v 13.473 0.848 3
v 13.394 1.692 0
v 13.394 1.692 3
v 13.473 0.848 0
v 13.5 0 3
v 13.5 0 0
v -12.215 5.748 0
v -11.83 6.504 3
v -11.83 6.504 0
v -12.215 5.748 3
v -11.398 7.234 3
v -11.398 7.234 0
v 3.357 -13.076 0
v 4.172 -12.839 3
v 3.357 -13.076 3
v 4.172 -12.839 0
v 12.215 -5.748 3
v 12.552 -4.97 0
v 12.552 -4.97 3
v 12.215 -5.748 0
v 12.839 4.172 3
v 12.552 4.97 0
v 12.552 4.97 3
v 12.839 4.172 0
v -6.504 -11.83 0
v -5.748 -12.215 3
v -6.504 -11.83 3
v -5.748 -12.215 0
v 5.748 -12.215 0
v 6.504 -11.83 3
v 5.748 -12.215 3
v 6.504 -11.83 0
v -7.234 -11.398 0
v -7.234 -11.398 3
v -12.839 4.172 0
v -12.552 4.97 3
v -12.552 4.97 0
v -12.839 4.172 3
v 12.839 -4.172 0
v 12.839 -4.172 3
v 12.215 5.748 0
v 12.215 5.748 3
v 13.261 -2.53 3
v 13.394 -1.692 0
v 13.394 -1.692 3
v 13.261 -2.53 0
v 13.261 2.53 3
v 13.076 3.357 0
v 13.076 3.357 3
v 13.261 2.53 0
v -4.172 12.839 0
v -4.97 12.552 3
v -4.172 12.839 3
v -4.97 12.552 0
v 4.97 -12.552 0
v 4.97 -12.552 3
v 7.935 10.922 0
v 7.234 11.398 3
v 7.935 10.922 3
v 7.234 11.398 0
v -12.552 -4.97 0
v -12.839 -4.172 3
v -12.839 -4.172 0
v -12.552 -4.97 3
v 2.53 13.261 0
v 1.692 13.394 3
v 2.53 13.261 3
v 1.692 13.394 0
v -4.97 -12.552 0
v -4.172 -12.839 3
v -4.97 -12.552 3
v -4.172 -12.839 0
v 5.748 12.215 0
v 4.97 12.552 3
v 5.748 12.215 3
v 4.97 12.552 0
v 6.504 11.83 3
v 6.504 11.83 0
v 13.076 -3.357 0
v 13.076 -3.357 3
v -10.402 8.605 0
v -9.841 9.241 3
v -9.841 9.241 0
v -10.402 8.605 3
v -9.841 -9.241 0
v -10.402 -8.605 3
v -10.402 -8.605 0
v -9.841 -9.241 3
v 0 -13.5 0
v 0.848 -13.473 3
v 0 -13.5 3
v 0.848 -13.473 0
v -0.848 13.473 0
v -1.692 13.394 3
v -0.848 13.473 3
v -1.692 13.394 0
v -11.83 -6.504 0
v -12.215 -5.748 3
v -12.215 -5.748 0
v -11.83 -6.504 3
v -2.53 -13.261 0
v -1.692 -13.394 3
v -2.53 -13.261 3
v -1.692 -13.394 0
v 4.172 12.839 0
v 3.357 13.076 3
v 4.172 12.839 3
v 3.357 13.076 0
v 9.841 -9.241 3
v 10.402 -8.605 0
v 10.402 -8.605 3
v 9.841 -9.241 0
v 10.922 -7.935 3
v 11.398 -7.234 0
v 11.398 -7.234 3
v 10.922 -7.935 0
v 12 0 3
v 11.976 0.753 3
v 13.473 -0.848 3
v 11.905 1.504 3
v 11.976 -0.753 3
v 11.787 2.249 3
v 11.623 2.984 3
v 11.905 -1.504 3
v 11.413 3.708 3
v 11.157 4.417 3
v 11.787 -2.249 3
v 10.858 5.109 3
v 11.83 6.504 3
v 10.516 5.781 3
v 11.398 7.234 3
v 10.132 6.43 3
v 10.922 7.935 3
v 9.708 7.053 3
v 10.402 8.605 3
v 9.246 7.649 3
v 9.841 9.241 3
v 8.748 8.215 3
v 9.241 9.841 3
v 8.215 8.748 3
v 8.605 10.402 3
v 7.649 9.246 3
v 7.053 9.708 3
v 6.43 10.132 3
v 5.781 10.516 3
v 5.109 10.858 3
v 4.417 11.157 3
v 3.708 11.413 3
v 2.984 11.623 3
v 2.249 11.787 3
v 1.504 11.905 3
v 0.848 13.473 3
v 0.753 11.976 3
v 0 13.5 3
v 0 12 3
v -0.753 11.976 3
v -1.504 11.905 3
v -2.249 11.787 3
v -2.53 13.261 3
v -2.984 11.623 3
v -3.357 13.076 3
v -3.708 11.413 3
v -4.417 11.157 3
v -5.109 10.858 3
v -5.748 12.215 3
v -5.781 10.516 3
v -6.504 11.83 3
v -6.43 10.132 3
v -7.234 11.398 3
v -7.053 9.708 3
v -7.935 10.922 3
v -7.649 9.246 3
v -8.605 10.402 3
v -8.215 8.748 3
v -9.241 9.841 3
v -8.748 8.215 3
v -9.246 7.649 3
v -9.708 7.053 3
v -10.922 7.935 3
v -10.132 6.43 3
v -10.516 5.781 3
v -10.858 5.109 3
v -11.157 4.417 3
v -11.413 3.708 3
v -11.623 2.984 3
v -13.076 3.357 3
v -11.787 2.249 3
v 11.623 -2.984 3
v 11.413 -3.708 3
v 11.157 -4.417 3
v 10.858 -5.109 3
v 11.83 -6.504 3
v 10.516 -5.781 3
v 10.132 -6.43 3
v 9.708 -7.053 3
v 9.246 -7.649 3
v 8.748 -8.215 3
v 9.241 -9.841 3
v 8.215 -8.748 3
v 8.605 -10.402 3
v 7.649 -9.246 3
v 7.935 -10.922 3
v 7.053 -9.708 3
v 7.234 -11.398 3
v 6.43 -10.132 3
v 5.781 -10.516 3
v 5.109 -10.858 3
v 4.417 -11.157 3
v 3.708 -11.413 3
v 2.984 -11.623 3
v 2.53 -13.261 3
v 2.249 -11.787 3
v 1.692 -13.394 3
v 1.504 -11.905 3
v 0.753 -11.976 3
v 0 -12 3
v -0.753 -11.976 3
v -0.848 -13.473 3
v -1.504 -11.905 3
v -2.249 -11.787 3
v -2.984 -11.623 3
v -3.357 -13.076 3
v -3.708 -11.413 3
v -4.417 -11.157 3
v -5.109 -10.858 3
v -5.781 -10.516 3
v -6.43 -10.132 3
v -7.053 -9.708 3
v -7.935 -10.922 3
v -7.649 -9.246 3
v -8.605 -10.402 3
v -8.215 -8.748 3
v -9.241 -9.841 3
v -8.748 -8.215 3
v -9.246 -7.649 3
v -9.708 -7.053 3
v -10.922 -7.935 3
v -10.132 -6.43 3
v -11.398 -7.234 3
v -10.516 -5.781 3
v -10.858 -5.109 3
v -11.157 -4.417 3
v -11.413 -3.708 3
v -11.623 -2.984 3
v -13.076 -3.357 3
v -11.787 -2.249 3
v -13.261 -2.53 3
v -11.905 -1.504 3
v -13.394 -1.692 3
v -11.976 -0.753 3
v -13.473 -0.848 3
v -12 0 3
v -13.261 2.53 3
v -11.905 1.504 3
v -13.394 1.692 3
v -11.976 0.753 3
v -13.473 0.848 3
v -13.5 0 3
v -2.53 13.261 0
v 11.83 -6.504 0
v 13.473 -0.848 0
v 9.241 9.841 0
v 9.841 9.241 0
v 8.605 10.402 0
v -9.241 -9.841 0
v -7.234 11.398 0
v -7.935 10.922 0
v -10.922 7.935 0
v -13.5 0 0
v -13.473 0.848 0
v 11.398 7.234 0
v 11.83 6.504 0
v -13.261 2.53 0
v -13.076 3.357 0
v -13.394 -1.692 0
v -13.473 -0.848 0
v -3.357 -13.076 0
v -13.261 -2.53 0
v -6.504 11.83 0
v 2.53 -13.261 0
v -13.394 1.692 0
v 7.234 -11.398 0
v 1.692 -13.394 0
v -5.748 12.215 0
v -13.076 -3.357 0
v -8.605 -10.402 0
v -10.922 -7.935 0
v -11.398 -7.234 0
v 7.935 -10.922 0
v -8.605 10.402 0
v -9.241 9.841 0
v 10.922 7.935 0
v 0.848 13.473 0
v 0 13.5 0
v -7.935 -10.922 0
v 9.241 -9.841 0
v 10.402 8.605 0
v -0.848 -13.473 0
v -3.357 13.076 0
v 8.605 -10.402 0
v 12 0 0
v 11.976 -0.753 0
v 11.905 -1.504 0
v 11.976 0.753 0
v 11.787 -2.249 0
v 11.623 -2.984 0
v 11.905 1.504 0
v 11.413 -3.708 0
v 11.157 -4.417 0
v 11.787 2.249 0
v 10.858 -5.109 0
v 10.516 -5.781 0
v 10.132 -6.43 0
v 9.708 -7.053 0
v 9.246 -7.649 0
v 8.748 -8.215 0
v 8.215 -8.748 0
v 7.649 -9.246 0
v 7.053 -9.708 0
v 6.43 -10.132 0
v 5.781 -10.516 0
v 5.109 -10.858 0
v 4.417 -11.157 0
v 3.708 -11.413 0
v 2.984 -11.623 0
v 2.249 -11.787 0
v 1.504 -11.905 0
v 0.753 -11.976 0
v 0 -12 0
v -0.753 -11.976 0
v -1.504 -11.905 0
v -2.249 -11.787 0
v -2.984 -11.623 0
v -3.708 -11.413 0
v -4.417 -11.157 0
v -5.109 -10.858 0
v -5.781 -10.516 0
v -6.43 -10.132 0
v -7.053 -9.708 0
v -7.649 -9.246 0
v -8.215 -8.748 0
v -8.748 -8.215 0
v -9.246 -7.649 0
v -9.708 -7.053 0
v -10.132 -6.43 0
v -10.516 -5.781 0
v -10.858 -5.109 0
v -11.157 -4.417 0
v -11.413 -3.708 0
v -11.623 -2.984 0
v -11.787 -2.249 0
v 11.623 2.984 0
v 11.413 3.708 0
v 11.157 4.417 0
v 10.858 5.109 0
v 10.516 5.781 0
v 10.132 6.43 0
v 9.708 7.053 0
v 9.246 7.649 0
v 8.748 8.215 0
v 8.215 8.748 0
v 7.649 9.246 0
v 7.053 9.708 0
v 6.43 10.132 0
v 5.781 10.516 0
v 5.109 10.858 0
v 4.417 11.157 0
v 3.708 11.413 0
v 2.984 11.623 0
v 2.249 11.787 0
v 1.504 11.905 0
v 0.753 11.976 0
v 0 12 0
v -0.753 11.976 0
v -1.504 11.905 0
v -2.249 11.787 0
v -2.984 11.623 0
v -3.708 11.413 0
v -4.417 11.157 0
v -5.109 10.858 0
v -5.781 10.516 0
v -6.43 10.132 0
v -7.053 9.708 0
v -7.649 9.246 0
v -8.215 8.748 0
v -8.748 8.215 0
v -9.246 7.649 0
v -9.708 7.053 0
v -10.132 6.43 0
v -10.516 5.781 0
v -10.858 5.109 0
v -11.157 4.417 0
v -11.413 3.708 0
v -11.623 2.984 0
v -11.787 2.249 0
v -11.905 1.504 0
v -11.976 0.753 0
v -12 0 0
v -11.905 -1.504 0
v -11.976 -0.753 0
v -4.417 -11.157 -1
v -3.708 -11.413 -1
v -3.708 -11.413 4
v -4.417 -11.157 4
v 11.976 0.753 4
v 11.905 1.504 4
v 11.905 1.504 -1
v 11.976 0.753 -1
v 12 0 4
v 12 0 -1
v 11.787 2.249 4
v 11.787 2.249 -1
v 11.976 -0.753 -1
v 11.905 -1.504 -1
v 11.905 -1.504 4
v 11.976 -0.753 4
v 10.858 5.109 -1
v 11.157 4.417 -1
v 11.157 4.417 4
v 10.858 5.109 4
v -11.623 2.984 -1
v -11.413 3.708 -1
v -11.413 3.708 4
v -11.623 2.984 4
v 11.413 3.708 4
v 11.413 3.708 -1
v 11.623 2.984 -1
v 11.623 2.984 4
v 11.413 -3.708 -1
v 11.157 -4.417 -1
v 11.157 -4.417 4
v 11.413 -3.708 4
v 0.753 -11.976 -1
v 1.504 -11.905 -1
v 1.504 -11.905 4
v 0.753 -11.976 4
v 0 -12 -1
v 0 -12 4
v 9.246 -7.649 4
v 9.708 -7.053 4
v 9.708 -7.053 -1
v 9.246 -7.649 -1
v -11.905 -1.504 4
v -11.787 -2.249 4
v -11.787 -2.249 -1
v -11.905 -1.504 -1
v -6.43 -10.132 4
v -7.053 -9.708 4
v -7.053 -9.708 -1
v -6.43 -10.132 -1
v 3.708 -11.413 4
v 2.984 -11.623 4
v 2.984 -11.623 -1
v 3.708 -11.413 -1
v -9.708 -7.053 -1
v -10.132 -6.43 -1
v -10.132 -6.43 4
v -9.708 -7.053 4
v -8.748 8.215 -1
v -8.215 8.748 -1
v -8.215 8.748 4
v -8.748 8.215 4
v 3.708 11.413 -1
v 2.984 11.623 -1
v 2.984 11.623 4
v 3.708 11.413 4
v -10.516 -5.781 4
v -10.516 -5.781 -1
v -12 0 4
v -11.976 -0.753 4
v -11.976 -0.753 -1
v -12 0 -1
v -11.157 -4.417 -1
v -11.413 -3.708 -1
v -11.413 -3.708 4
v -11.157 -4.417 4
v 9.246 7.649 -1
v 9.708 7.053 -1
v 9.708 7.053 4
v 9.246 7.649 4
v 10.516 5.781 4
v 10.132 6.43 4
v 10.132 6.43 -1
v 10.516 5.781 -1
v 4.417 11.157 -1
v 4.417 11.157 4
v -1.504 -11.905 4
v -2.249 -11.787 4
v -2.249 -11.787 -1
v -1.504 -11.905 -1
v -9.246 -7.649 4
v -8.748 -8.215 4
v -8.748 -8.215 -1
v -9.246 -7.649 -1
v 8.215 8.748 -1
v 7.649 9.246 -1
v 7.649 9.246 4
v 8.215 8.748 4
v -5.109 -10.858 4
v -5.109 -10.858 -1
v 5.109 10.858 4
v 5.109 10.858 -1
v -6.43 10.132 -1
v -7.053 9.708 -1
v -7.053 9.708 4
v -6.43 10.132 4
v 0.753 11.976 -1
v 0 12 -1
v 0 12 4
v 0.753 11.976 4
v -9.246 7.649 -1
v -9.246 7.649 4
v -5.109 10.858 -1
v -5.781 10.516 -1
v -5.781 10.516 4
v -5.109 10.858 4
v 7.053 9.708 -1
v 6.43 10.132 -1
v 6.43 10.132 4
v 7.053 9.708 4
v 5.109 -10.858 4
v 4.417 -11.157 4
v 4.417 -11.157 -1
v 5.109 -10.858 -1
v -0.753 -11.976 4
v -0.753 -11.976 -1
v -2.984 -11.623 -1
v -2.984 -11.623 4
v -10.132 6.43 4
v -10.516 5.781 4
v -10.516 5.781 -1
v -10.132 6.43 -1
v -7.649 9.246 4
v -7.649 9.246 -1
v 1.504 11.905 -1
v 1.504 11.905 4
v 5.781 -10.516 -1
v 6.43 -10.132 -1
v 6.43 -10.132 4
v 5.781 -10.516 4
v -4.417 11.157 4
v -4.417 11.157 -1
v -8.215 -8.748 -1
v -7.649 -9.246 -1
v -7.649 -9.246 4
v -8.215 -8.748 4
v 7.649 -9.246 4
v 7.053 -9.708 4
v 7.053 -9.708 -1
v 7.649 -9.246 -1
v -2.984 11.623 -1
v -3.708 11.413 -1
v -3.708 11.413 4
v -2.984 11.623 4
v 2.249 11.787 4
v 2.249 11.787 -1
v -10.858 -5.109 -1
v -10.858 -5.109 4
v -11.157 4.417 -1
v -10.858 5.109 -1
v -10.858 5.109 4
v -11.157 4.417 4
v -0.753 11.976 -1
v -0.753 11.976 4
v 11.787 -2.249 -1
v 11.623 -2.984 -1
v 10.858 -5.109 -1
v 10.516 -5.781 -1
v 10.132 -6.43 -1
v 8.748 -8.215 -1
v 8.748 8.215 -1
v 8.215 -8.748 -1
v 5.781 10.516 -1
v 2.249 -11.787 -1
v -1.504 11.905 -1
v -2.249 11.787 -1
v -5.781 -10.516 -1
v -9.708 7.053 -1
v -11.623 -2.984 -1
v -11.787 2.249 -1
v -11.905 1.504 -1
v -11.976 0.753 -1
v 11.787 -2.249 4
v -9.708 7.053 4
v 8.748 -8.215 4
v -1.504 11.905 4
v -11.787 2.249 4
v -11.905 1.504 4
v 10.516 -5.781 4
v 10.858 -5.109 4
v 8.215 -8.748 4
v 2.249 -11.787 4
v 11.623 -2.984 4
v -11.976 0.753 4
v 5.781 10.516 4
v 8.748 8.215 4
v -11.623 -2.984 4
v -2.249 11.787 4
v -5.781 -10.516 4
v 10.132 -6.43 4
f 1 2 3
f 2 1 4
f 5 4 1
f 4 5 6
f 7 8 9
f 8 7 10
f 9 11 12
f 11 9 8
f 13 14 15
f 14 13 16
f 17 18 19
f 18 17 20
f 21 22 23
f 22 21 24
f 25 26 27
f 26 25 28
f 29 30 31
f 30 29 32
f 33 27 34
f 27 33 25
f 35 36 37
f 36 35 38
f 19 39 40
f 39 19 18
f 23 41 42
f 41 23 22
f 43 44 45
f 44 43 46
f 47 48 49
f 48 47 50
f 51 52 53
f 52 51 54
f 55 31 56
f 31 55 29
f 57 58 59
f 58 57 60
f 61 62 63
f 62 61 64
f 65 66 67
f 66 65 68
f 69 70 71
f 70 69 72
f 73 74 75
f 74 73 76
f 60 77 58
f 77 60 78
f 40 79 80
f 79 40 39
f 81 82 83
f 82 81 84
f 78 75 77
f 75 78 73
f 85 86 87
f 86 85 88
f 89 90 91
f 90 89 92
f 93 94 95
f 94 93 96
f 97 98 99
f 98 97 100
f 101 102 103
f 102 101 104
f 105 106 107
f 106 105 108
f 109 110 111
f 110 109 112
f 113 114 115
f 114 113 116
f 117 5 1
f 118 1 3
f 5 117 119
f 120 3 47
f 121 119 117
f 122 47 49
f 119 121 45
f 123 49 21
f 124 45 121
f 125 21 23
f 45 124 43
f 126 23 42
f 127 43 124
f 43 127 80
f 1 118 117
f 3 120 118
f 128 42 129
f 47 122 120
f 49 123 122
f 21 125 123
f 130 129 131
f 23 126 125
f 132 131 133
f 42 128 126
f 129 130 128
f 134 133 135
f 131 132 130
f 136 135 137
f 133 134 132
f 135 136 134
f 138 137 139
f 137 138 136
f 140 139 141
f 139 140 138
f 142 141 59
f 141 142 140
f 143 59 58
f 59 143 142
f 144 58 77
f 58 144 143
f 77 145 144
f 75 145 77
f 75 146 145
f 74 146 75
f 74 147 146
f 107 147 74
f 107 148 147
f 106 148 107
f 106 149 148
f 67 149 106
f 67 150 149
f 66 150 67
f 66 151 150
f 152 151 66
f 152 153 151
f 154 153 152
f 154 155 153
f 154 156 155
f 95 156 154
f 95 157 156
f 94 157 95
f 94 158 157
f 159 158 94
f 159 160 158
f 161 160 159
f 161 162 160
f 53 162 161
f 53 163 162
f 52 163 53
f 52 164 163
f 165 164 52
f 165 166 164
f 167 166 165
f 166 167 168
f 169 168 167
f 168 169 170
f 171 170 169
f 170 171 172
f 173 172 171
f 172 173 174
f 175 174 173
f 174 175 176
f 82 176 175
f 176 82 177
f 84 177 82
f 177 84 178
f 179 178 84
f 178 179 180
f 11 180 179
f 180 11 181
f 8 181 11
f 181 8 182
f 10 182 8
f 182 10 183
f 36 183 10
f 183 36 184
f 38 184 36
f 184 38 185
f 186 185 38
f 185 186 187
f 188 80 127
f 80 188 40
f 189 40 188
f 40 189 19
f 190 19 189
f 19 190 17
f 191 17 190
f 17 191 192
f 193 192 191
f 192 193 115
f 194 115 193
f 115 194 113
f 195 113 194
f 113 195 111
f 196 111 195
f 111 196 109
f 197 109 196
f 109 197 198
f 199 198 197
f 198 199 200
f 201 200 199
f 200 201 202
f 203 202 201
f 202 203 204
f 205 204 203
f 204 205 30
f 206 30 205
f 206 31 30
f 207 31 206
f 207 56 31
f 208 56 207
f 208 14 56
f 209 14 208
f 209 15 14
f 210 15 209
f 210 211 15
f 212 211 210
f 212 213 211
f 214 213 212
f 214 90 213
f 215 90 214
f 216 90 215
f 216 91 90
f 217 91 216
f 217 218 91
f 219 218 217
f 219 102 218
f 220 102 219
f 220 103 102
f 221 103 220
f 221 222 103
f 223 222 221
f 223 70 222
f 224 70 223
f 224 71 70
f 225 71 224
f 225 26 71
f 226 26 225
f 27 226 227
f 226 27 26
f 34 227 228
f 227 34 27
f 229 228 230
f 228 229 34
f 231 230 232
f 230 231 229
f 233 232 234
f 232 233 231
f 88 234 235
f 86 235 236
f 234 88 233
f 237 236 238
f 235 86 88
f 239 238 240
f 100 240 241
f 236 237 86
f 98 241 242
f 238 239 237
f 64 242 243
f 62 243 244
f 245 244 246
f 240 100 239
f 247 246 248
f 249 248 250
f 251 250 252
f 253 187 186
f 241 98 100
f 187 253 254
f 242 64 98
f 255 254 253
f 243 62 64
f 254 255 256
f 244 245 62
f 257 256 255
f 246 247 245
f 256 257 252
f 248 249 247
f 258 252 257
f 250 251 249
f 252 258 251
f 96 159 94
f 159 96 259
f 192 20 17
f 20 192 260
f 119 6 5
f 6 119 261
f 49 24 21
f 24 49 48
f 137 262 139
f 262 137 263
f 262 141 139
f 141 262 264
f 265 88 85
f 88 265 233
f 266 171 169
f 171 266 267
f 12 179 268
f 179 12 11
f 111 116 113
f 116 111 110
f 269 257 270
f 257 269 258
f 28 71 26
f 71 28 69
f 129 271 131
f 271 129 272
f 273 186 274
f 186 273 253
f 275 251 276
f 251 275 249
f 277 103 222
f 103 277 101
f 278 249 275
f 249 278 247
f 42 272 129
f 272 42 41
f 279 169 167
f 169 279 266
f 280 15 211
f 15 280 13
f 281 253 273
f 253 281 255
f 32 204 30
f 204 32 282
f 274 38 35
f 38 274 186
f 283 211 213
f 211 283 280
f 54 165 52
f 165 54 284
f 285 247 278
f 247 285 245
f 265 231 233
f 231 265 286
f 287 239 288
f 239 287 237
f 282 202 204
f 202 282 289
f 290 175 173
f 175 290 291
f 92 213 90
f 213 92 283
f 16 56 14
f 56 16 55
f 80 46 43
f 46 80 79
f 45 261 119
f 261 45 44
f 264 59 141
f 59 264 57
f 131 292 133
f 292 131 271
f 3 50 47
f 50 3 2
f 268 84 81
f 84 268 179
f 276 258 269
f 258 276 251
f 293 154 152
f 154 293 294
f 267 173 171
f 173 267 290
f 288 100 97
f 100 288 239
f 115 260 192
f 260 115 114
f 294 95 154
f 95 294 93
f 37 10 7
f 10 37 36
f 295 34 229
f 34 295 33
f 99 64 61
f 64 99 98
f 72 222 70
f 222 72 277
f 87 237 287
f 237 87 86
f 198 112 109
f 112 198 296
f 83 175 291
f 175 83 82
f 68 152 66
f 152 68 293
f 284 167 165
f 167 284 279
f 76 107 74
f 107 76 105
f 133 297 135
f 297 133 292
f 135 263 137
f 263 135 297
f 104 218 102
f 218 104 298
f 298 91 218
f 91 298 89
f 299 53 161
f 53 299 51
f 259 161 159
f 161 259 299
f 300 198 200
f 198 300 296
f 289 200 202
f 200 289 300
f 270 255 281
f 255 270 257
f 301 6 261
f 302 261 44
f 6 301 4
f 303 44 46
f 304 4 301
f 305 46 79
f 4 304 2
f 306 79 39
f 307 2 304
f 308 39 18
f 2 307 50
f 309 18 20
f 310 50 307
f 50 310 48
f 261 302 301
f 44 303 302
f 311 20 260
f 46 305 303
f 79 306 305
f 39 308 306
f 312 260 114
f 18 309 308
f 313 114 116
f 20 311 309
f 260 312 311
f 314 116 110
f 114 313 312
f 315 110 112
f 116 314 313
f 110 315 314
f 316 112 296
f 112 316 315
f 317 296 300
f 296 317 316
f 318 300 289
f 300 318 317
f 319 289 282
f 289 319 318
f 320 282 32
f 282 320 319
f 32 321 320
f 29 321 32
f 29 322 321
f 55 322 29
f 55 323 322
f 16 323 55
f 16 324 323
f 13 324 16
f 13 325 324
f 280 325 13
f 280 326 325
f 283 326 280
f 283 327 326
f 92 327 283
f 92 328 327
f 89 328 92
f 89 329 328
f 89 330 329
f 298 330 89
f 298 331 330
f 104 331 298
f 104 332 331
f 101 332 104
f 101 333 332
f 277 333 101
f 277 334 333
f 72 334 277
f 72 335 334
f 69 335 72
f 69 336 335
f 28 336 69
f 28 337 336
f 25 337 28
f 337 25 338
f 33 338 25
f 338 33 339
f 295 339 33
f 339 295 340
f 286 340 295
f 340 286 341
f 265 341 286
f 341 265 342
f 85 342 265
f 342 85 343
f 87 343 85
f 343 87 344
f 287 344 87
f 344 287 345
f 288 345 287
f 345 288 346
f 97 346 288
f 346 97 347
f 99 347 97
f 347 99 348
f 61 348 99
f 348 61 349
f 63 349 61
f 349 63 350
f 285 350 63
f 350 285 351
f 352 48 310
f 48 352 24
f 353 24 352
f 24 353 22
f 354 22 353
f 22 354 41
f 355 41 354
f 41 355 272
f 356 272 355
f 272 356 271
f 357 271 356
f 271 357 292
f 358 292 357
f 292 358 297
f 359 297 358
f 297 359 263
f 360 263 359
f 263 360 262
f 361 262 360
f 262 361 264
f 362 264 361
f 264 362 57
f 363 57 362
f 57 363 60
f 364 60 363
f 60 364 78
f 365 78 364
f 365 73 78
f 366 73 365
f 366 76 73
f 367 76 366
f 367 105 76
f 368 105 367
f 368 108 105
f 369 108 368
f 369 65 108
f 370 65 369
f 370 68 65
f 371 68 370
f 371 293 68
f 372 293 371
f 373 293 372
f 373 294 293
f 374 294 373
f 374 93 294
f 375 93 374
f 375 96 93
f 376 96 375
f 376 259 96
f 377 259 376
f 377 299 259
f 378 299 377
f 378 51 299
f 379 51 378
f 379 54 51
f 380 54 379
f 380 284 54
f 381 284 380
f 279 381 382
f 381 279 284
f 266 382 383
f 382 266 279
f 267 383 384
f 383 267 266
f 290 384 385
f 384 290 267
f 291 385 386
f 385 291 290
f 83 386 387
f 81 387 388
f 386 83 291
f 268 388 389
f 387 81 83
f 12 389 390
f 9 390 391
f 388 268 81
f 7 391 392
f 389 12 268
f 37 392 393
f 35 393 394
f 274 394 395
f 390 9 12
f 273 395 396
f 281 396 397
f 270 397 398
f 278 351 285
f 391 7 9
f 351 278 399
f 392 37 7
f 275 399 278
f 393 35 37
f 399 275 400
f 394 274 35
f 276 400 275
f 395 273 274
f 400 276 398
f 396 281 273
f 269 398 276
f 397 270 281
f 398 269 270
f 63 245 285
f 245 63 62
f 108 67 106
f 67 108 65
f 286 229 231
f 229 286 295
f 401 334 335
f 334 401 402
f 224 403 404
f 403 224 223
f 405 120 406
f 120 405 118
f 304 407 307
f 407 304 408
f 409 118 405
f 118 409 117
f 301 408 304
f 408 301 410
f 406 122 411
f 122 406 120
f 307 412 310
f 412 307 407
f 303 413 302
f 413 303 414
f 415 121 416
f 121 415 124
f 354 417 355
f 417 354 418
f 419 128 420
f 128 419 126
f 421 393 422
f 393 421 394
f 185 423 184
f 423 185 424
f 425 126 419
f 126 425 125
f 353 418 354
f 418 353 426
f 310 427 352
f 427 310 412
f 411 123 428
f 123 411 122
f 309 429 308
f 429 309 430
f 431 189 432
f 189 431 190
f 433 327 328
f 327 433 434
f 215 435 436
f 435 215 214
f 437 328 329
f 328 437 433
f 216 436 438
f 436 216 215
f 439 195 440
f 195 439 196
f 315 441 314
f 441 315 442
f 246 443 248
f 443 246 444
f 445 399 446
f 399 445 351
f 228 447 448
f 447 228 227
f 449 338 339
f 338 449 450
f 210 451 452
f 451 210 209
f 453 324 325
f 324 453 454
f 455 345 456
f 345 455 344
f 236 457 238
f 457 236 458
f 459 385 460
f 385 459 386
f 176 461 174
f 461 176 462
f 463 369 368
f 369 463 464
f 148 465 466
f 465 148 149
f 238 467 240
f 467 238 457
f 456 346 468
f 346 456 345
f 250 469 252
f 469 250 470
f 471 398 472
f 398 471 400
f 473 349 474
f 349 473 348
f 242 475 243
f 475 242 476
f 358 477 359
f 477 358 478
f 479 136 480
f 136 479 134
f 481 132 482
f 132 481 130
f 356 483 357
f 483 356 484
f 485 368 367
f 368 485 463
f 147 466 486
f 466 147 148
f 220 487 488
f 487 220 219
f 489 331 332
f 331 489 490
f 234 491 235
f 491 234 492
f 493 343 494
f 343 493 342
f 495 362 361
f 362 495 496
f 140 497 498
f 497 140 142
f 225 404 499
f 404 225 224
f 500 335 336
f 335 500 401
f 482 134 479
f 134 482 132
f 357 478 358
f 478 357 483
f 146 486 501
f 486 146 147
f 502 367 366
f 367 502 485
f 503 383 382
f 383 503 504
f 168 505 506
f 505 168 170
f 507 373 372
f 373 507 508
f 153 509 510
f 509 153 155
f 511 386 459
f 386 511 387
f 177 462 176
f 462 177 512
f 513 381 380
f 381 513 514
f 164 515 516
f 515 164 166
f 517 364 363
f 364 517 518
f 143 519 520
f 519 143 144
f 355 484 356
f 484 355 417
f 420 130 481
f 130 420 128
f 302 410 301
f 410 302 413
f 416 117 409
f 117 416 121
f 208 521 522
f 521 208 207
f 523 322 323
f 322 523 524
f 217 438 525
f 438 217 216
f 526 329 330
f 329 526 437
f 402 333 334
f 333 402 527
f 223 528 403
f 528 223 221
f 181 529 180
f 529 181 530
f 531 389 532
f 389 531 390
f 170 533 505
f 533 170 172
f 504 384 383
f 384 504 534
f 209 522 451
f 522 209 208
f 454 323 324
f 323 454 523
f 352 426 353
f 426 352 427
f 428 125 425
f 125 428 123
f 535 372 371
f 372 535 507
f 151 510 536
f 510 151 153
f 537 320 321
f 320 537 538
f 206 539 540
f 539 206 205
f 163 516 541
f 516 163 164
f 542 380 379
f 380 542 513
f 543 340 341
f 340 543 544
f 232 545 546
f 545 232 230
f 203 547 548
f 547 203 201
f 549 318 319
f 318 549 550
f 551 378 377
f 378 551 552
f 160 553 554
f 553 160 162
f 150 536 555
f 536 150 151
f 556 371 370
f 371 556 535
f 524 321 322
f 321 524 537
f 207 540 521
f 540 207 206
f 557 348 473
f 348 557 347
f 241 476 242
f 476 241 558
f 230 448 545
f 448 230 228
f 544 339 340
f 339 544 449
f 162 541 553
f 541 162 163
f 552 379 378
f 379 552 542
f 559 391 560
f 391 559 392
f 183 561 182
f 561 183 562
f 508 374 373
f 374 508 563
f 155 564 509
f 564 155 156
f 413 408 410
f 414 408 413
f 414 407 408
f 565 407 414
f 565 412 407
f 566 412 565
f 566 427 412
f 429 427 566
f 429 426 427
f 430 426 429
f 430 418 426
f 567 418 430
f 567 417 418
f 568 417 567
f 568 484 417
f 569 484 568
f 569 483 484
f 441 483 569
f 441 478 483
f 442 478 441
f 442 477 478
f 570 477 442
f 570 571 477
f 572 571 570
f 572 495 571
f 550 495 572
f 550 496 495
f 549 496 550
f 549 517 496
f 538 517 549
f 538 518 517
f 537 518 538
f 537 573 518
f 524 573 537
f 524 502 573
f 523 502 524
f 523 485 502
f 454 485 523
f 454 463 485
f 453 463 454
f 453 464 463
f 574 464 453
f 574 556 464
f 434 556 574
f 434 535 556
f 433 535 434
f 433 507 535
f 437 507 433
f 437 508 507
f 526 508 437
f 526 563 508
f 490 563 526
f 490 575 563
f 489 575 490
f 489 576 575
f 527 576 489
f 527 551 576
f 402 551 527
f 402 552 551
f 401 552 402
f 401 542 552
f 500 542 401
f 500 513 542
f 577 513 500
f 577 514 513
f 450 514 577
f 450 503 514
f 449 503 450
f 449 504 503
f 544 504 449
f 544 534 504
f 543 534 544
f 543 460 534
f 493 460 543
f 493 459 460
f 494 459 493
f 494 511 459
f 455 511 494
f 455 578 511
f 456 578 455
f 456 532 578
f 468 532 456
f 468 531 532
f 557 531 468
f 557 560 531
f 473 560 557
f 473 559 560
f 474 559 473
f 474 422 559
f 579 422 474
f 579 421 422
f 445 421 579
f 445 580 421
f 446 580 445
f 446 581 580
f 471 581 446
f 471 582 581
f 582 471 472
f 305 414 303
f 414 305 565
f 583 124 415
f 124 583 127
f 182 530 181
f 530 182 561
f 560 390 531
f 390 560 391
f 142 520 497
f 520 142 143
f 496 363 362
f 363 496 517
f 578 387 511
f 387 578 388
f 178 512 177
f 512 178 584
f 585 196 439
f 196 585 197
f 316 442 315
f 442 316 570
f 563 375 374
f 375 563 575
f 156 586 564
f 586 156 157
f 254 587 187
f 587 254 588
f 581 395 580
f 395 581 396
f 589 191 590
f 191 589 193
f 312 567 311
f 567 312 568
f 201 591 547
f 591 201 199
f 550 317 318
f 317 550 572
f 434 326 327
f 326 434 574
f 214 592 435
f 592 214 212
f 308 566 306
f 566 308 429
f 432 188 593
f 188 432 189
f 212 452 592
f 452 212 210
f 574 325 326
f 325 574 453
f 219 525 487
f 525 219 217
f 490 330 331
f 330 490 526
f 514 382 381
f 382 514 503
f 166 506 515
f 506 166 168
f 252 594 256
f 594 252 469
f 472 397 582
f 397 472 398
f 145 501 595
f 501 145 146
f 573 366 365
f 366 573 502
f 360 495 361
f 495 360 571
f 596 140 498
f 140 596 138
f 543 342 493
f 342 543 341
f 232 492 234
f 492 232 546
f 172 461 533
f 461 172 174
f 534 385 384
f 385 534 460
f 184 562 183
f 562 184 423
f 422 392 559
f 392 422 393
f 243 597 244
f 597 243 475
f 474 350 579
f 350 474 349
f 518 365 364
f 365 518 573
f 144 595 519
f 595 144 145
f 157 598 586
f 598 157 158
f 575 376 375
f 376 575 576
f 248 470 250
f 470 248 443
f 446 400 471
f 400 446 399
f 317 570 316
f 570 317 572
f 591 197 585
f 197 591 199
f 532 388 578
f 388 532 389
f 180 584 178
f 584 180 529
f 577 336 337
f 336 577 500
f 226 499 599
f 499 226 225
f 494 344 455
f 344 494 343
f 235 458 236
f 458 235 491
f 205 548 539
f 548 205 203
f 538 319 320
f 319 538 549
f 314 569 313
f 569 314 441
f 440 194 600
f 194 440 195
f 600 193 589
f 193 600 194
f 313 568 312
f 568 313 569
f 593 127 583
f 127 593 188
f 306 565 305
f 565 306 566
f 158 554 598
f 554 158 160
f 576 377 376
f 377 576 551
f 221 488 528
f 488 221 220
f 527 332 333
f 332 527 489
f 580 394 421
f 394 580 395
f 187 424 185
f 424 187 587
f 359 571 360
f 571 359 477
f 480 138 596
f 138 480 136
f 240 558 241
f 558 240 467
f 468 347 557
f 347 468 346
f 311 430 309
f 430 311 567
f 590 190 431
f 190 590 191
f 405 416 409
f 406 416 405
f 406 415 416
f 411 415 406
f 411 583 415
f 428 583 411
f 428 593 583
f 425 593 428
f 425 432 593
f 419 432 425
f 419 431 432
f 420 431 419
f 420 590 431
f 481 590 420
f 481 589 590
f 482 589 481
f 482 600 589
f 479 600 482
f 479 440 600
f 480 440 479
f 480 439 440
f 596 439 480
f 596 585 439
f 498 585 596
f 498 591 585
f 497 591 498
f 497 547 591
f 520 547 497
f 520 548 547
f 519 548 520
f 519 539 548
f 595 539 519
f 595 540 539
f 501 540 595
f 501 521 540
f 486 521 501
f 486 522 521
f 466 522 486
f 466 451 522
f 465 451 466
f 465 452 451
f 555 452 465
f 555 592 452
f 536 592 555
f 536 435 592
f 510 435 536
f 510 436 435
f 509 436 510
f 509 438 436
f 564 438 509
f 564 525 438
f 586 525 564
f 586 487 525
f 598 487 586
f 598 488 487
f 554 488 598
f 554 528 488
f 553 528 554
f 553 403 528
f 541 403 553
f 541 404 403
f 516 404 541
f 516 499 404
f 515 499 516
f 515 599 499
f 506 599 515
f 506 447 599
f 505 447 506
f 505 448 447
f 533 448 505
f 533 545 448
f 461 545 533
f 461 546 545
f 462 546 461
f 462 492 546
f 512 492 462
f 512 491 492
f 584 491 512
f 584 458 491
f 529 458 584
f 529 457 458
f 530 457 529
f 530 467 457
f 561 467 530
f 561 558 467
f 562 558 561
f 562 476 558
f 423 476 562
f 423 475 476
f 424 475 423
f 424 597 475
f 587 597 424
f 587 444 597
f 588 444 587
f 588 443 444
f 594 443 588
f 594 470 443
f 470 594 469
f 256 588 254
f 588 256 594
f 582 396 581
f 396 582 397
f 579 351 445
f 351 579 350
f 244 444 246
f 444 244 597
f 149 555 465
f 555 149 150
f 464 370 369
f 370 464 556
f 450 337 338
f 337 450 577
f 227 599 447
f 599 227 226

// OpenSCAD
// Dimensiones
outer_diameter = 27; // Diámetro exterior
inner_diameter = 24; // Diámetro interior
thickness = 3;       // Espesor total
inner_step_diameter = 23; // Diámetro del escalón interno
inner_step_thickness = 1.5; // Espesor del escalón interno

module corona_circular() {
//    difference() {
        // Cilindro exterior completo
        cylinder(d = outer_diameter, h = thickness, $fn=100);
        
        // Crear el hueco interior completo
        translate([0, 0, -1])
            cylinder(d = inner_diameter, h = thickness + 2, $fn=100);
        
        // Crear el escalón interno
        translate([0, 0, 1.5])
            cylinder(d = inner_step_diameter, h = thickness - inner_step_thickness, $fn=100);
 //   }
}

// Llamar al módulo para generar la pieza
corona_circular();
